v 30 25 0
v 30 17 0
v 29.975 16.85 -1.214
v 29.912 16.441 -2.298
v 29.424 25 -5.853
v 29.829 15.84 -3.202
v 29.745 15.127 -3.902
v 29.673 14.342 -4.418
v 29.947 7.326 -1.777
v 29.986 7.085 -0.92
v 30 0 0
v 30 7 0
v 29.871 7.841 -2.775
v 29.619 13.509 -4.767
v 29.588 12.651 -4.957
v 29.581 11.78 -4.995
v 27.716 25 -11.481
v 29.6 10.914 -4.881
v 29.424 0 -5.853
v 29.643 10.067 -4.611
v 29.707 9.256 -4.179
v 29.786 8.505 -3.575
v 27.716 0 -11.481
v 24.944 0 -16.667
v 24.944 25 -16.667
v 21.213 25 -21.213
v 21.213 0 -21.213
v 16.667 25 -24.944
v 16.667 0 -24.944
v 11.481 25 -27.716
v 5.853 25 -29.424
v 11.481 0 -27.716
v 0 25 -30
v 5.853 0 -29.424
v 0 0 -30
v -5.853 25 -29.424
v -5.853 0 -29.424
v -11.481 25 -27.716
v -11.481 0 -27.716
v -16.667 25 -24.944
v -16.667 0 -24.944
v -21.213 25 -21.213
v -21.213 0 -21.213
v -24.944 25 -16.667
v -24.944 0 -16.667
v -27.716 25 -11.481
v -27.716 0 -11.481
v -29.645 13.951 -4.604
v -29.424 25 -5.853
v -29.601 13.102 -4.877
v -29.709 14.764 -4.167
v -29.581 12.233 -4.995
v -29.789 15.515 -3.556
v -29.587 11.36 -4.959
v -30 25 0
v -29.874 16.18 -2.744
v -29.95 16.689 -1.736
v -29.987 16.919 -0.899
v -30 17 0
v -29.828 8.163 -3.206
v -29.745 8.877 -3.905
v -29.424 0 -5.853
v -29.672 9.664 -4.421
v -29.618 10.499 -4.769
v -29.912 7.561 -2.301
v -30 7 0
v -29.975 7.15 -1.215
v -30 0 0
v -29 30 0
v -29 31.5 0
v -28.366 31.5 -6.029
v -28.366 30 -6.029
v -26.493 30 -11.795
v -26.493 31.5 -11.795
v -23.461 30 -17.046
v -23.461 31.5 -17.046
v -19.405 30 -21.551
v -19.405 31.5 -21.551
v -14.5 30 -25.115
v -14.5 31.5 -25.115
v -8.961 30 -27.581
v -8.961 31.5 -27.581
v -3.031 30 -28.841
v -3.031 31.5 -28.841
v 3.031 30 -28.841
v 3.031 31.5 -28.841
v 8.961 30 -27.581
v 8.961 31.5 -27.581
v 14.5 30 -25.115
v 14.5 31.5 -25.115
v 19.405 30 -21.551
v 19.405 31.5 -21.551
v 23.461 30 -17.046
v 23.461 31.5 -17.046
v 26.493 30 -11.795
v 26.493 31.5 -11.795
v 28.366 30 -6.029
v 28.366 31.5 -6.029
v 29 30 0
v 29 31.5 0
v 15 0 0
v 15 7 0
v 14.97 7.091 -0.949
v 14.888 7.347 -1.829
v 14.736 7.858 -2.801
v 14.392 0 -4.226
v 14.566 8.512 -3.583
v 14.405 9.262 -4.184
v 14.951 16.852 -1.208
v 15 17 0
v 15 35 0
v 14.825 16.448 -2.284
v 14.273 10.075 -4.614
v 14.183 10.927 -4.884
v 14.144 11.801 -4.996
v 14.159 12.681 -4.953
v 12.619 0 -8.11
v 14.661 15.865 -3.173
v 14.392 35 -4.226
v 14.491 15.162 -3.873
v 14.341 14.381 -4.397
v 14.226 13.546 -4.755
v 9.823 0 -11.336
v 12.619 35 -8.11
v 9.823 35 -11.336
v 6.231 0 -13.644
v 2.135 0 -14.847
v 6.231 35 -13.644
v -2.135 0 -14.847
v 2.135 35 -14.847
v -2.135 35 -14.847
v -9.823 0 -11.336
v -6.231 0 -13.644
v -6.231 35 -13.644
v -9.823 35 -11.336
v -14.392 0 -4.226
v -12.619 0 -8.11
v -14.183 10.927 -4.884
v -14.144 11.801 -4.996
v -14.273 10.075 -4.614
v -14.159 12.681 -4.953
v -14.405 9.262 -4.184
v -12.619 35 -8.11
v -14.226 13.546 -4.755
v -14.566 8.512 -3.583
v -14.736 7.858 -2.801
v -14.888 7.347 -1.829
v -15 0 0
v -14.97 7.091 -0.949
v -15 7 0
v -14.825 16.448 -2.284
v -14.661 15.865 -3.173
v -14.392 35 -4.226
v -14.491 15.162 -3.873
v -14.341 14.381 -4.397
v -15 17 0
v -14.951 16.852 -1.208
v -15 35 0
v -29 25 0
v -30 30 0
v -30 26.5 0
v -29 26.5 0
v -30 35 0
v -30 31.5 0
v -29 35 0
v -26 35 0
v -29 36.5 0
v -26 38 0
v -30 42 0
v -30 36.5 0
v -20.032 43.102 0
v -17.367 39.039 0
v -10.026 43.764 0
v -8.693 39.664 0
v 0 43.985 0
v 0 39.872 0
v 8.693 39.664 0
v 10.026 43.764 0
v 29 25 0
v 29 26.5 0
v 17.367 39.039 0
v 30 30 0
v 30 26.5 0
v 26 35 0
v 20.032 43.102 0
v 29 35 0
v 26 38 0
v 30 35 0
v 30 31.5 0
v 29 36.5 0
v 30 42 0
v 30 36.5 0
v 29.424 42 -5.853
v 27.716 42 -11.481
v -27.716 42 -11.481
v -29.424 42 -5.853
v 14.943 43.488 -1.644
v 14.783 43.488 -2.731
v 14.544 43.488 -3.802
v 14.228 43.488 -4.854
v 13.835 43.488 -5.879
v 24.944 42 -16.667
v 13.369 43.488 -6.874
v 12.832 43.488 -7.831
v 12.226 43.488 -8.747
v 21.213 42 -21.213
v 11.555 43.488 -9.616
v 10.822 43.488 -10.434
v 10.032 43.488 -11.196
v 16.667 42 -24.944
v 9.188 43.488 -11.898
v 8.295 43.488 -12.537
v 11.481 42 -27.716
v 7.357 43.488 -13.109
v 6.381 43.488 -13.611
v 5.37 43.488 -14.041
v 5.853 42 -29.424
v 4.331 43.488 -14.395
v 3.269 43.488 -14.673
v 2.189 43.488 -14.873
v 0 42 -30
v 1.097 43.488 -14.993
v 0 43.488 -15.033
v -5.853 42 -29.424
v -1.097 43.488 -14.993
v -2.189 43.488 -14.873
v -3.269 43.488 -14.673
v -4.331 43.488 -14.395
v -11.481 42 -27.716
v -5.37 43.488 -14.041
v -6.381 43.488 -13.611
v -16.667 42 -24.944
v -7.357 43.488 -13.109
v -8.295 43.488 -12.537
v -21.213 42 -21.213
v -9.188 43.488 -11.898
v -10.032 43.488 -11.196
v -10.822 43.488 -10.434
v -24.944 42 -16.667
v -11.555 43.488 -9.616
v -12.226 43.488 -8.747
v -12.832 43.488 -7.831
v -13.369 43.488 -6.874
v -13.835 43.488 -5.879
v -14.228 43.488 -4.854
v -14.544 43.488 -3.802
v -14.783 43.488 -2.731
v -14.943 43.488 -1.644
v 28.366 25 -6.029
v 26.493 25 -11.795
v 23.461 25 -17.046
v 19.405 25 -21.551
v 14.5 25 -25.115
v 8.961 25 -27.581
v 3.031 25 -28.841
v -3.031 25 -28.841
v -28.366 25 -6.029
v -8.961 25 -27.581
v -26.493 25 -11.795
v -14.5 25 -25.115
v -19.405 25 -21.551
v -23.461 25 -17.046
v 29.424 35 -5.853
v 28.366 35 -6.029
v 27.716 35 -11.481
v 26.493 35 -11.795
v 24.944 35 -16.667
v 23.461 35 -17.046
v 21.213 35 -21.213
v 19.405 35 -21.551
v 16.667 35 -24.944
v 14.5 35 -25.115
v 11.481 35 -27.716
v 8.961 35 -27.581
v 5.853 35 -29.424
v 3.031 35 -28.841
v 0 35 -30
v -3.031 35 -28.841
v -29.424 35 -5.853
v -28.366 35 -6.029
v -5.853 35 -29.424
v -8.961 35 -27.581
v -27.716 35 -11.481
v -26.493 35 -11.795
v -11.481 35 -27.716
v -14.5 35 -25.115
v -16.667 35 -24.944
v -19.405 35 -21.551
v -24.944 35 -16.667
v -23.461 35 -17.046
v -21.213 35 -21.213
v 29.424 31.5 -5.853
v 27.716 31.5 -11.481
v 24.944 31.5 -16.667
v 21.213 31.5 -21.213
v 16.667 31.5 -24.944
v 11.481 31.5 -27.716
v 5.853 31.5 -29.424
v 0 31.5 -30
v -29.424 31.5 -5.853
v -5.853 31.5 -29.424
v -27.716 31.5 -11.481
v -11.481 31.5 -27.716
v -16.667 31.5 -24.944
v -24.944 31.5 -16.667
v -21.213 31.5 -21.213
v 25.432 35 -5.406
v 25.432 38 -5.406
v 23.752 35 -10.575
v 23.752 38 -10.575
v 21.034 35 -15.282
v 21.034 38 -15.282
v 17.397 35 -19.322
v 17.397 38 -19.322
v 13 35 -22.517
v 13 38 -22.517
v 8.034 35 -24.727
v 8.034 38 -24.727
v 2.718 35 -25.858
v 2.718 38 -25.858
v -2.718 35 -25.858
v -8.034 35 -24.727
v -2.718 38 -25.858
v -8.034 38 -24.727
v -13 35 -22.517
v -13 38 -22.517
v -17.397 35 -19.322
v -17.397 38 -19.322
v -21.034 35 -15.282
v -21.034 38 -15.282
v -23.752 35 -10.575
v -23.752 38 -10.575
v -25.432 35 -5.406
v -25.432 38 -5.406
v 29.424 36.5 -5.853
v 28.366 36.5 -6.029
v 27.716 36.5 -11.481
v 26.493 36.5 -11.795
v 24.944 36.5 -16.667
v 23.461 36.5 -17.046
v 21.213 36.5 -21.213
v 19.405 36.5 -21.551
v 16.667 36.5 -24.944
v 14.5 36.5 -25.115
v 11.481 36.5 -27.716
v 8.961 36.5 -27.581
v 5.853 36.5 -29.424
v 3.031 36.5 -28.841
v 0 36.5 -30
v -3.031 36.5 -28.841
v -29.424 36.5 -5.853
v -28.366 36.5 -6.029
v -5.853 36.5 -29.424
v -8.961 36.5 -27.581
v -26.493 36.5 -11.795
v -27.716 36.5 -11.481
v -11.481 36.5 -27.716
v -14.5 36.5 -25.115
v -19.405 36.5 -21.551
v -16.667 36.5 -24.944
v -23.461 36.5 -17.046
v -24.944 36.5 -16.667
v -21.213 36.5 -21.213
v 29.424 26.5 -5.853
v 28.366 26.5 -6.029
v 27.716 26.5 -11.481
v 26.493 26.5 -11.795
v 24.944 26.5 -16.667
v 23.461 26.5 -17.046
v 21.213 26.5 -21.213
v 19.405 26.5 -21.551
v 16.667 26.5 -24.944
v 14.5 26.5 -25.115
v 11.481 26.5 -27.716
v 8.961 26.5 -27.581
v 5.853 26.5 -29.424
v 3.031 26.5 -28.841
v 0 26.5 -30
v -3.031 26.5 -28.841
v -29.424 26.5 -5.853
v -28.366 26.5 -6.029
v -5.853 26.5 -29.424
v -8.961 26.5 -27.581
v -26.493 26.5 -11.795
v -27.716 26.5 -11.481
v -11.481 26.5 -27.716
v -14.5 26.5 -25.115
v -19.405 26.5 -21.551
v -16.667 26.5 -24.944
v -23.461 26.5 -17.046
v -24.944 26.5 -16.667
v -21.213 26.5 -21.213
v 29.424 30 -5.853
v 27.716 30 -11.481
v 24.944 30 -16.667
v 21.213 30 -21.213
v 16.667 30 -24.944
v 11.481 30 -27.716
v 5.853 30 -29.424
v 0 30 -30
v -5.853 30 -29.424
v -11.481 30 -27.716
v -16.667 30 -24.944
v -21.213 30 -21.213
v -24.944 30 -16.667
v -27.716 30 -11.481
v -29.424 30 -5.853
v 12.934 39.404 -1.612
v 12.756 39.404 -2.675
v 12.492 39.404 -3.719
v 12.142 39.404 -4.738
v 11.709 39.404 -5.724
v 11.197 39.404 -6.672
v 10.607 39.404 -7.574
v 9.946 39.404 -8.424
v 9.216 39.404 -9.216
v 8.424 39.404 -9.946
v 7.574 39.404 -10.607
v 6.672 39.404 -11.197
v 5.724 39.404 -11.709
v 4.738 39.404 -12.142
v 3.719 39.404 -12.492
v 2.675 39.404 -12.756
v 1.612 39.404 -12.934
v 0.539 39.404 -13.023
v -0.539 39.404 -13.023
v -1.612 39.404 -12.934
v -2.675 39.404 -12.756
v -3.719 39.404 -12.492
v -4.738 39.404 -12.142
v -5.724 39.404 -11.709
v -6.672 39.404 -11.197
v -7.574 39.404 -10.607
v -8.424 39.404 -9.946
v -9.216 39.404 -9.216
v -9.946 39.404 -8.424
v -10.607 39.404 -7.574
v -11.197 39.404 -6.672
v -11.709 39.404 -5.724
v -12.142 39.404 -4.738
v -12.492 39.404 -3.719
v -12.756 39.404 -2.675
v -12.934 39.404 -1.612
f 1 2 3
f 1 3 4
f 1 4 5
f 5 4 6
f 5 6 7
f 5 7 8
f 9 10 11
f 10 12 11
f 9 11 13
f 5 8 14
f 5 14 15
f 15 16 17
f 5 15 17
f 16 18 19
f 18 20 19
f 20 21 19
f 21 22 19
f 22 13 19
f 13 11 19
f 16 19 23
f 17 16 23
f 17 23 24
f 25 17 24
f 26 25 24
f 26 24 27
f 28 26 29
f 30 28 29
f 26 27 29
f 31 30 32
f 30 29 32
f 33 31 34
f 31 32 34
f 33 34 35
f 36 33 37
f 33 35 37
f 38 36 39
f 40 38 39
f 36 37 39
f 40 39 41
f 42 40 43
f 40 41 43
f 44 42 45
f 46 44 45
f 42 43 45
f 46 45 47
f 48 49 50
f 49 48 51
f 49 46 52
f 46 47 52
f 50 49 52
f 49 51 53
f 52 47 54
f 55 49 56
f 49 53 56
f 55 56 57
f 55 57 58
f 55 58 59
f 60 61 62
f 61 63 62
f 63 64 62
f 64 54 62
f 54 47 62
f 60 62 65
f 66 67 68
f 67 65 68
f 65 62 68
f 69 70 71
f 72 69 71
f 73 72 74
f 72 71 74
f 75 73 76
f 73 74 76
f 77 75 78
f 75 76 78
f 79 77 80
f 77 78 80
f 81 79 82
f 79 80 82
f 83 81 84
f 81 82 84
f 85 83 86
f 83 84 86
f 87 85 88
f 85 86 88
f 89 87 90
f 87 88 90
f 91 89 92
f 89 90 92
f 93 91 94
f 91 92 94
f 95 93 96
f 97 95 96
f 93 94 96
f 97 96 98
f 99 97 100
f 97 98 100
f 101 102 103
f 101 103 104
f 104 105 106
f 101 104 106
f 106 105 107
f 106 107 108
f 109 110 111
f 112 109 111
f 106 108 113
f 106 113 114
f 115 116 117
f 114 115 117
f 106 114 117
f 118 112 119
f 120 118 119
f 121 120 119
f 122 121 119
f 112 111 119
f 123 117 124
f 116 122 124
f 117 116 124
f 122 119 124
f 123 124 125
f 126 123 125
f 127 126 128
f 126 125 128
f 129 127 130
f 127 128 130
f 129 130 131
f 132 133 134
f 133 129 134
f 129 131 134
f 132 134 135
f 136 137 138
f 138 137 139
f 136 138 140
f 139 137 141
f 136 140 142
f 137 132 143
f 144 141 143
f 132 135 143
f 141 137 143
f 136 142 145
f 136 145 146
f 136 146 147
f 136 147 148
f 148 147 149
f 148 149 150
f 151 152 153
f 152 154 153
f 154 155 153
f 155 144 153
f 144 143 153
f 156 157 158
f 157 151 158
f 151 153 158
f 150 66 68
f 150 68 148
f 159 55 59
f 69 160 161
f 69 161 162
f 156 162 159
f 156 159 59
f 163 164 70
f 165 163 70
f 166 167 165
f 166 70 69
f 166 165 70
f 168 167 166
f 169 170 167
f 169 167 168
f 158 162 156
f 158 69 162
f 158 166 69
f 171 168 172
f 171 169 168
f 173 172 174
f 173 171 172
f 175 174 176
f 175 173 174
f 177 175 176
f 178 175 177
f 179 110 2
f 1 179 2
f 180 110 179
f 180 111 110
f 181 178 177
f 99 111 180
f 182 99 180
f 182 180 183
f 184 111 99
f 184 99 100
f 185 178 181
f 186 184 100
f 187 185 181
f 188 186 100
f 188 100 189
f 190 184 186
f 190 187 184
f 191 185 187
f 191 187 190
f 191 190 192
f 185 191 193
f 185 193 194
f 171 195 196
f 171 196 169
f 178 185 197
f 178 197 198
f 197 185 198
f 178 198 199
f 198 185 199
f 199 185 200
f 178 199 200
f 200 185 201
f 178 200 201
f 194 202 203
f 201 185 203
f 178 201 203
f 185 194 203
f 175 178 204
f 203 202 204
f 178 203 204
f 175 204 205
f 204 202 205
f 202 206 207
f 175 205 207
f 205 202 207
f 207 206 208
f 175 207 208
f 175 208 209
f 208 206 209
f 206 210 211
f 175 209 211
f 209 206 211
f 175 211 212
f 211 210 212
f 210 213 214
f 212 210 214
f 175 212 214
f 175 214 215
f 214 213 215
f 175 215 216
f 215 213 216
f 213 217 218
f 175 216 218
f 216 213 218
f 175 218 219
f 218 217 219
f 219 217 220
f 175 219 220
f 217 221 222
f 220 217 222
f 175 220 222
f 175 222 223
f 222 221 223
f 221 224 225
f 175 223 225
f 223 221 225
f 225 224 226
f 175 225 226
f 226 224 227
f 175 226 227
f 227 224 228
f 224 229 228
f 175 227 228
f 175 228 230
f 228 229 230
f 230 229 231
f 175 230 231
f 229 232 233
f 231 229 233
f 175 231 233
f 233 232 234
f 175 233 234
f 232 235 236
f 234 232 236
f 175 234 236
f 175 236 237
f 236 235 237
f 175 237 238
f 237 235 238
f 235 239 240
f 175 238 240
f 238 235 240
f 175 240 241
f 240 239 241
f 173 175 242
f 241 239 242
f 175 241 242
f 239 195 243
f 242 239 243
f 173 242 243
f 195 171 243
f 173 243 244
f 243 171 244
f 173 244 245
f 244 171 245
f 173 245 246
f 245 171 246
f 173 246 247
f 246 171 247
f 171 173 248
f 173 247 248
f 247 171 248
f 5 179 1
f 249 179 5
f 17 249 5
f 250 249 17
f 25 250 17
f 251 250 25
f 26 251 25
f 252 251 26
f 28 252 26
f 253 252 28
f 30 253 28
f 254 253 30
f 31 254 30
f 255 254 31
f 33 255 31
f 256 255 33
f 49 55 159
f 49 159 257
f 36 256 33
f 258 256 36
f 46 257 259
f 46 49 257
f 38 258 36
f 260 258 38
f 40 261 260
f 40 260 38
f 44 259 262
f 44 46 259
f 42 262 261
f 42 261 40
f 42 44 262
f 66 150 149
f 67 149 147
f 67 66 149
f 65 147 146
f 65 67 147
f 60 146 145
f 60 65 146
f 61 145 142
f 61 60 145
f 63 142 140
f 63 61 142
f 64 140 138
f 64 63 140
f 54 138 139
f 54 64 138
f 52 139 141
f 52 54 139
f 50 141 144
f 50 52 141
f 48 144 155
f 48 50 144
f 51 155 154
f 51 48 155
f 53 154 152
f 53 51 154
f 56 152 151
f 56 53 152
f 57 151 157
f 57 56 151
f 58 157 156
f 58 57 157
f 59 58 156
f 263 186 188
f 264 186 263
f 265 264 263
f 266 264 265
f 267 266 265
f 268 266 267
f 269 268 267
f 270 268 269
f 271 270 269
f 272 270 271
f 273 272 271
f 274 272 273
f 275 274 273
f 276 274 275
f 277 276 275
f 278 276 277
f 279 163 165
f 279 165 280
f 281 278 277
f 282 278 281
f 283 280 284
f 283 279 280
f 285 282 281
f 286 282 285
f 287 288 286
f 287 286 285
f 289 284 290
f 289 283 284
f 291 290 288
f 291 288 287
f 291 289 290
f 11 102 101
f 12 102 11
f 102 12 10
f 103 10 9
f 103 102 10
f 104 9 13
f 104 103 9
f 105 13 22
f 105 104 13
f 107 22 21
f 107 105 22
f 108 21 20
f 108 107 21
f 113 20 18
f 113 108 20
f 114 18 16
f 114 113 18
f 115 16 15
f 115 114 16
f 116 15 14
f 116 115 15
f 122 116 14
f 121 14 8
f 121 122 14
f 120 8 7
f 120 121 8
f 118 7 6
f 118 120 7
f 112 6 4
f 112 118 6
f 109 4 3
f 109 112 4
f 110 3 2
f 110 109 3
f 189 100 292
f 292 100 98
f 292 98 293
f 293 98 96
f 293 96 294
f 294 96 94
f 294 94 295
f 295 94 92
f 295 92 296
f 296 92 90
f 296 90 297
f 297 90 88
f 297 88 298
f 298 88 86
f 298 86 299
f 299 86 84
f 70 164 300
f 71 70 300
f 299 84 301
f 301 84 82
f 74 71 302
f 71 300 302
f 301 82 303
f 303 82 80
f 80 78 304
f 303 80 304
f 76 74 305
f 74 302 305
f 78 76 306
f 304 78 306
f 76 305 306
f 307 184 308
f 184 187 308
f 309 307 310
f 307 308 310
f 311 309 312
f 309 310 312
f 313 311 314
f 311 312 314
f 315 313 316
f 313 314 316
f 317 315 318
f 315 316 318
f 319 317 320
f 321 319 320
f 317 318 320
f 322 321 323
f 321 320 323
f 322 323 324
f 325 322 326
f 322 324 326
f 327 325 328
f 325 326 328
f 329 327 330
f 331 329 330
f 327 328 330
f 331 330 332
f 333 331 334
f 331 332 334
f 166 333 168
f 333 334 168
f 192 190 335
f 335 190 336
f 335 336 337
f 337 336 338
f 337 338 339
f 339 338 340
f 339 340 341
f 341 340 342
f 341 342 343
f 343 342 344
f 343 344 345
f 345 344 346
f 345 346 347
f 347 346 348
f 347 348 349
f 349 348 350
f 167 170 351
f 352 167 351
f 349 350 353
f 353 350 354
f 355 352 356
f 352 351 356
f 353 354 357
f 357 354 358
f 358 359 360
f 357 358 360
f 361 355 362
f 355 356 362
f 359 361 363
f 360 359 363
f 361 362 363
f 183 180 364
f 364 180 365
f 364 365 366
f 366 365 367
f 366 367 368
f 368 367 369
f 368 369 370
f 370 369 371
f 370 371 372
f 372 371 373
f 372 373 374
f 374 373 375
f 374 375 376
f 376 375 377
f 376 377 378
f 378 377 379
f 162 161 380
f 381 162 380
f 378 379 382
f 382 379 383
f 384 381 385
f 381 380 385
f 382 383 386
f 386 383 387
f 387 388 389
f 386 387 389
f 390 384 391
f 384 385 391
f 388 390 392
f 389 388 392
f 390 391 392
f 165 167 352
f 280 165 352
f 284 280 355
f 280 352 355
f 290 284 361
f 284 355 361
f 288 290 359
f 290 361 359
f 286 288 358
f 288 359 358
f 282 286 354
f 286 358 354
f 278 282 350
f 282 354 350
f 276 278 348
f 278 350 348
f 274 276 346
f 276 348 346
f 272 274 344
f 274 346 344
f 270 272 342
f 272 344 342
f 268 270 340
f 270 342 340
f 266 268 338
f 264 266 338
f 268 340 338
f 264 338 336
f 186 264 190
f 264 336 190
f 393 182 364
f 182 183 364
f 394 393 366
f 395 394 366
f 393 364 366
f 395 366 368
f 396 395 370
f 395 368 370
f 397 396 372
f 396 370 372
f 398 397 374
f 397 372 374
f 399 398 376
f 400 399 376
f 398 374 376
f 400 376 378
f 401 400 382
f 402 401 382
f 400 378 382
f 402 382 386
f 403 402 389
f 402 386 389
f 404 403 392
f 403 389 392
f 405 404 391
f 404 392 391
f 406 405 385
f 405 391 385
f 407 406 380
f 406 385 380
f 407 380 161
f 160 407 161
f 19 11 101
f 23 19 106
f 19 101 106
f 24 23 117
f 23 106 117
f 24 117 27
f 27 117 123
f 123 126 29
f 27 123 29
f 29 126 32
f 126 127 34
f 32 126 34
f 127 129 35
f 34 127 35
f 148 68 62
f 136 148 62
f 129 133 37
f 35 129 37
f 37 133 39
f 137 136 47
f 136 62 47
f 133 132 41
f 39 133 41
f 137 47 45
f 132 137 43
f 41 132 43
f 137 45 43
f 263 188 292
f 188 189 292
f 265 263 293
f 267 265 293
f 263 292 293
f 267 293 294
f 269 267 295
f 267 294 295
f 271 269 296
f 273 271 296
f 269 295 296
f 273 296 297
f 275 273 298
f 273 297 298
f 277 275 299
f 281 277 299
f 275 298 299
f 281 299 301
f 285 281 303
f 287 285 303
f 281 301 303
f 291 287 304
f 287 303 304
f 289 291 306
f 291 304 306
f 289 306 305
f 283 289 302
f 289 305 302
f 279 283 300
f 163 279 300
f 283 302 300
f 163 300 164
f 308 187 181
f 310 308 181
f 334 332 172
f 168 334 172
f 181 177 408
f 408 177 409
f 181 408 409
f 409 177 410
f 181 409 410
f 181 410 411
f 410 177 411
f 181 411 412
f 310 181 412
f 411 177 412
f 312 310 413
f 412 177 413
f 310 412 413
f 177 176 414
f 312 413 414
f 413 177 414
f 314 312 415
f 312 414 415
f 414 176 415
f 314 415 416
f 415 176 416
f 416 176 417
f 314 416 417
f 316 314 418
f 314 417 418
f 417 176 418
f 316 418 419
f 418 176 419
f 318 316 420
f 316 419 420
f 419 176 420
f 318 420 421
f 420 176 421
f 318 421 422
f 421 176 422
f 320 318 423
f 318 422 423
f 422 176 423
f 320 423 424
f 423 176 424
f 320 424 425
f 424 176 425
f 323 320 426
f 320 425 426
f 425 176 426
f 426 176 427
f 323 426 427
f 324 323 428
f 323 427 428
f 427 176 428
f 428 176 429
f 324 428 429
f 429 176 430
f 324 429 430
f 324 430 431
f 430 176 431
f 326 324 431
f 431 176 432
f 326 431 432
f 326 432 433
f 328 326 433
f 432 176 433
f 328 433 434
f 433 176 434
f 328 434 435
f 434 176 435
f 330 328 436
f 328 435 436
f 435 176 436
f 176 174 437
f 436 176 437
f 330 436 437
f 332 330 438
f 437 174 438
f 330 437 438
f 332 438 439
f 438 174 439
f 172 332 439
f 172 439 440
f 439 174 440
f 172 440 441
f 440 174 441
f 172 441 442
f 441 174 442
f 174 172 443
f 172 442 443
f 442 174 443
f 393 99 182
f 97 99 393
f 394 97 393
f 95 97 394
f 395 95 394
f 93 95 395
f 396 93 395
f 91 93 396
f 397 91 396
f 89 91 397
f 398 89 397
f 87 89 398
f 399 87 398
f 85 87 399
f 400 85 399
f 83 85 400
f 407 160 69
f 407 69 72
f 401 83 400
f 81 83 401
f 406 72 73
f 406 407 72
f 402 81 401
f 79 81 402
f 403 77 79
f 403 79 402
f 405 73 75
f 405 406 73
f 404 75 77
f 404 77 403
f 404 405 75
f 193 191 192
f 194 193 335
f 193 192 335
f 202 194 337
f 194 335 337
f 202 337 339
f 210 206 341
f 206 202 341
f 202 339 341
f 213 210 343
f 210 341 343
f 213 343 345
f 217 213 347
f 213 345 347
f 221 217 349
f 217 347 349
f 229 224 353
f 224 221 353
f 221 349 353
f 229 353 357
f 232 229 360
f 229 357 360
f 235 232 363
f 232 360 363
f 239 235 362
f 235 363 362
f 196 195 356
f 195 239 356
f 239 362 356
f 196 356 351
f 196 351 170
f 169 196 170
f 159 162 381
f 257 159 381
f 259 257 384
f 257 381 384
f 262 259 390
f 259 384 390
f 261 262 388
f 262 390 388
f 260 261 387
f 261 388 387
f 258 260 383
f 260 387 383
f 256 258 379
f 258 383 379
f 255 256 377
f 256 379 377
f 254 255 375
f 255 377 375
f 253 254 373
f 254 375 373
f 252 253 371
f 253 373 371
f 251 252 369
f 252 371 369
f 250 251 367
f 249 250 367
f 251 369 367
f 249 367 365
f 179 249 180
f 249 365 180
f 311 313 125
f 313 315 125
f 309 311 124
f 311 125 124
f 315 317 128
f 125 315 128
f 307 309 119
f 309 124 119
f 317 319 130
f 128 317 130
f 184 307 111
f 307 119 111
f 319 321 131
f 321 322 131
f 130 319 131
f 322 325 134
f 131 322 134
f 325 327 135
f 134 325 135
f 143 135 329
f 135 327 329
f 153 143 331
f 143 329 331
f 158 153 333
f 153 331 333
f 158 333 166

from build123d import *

# Parameters (mm, degrees)
CUT_EXTRUDE1_DEPTH      = 62.112017288
CUT_EXTRUDE1_DEPTH_BACK = 62.112017288
SKETCH2_R               = 5
SKETCH3_W               = 1
SKETCH3_H               = 1.5
SKETCH4_W               = 103.716801646
SKETCH4_H               = 65.276308729
CUT_EXTRUDE2_DEPTH      = 40


with BuildPart() as part:
    # Sketch1 → Revolve2 (revolve)
    with BuildSketch(Plane.XY):
        with BuildLine():
            Line((15, 35), (15, 0))
            Line((15, 0), (30, 0))
            Line((30, 0), (30, 42))
            ThreePointArc((30, 42), (15.03279876, 43.488194683), (0, 43.984982176))
            Line((0, 43.984982176), (0, 39.872478009))
            ThreePointArc((0, 39.872478009), (13.033669609, 39.403753083), (26, 38))
            Line((26, 38), (26, 35))
            Line((26, 35), (15, 35))
        make_face()
    revolve(axis=Axis((0, 45, 0), (0, 1, 0)))

    # Sketch2 → Cut-Extrude1 (cut, two sides: drawn at the far end of the back side and taken through both)
    with BuildSketch(Plane(origin=(0, 0, 0), x_dir=(0, 0, -1), z_dir=(1, 0, 0)).offset(-CUT_EXTRUDE1_DEPTH_BACK)):
        with Locations((0, 12)):
            Circle(SKETCH2_R)
    extrude(amount=CUT_EXTRUDE1_DEPTH + CUT_EXTRUDE1_DEPTH_BACK, mode=Mode.SUBTRACT)

    # Sketch3 → Cut-Revolve1 (revolve, cut)
    with BuildSketch(Plane(origin=(0, 0, 0), x_dir=(0, 0, -1), z_dir=(1, 0, 0))):
        with Locations((29.5, 35.75)):
            Rectangle(SKETCH3_W, SKETCH3_H)
        with Locations((29.5, 30.75)):
            Rectangle(SKETCH3_W, SKETCH3_H)
        with Locations((29.5, 25.75)):
            Rectangle(SKETCH3_W, SKETCH3_H)
    revolve(axis=Axis((0, 42, 0), (0, -1, 0)), mode=Mode.SUBTRACT)

    # Sketch4 → Cut-Extrude2 (cut)
    with BuildSketch(Plane.XY):
        with Locations((-0.592885071, 21.596736742)):
            Rectangle(SKETCH4_W, SKETCH4_H)
    extrude(amount=CUT_EXTRUDE2_DEPTH, mode=Mode.SUBTRACT)


solid = part.part
